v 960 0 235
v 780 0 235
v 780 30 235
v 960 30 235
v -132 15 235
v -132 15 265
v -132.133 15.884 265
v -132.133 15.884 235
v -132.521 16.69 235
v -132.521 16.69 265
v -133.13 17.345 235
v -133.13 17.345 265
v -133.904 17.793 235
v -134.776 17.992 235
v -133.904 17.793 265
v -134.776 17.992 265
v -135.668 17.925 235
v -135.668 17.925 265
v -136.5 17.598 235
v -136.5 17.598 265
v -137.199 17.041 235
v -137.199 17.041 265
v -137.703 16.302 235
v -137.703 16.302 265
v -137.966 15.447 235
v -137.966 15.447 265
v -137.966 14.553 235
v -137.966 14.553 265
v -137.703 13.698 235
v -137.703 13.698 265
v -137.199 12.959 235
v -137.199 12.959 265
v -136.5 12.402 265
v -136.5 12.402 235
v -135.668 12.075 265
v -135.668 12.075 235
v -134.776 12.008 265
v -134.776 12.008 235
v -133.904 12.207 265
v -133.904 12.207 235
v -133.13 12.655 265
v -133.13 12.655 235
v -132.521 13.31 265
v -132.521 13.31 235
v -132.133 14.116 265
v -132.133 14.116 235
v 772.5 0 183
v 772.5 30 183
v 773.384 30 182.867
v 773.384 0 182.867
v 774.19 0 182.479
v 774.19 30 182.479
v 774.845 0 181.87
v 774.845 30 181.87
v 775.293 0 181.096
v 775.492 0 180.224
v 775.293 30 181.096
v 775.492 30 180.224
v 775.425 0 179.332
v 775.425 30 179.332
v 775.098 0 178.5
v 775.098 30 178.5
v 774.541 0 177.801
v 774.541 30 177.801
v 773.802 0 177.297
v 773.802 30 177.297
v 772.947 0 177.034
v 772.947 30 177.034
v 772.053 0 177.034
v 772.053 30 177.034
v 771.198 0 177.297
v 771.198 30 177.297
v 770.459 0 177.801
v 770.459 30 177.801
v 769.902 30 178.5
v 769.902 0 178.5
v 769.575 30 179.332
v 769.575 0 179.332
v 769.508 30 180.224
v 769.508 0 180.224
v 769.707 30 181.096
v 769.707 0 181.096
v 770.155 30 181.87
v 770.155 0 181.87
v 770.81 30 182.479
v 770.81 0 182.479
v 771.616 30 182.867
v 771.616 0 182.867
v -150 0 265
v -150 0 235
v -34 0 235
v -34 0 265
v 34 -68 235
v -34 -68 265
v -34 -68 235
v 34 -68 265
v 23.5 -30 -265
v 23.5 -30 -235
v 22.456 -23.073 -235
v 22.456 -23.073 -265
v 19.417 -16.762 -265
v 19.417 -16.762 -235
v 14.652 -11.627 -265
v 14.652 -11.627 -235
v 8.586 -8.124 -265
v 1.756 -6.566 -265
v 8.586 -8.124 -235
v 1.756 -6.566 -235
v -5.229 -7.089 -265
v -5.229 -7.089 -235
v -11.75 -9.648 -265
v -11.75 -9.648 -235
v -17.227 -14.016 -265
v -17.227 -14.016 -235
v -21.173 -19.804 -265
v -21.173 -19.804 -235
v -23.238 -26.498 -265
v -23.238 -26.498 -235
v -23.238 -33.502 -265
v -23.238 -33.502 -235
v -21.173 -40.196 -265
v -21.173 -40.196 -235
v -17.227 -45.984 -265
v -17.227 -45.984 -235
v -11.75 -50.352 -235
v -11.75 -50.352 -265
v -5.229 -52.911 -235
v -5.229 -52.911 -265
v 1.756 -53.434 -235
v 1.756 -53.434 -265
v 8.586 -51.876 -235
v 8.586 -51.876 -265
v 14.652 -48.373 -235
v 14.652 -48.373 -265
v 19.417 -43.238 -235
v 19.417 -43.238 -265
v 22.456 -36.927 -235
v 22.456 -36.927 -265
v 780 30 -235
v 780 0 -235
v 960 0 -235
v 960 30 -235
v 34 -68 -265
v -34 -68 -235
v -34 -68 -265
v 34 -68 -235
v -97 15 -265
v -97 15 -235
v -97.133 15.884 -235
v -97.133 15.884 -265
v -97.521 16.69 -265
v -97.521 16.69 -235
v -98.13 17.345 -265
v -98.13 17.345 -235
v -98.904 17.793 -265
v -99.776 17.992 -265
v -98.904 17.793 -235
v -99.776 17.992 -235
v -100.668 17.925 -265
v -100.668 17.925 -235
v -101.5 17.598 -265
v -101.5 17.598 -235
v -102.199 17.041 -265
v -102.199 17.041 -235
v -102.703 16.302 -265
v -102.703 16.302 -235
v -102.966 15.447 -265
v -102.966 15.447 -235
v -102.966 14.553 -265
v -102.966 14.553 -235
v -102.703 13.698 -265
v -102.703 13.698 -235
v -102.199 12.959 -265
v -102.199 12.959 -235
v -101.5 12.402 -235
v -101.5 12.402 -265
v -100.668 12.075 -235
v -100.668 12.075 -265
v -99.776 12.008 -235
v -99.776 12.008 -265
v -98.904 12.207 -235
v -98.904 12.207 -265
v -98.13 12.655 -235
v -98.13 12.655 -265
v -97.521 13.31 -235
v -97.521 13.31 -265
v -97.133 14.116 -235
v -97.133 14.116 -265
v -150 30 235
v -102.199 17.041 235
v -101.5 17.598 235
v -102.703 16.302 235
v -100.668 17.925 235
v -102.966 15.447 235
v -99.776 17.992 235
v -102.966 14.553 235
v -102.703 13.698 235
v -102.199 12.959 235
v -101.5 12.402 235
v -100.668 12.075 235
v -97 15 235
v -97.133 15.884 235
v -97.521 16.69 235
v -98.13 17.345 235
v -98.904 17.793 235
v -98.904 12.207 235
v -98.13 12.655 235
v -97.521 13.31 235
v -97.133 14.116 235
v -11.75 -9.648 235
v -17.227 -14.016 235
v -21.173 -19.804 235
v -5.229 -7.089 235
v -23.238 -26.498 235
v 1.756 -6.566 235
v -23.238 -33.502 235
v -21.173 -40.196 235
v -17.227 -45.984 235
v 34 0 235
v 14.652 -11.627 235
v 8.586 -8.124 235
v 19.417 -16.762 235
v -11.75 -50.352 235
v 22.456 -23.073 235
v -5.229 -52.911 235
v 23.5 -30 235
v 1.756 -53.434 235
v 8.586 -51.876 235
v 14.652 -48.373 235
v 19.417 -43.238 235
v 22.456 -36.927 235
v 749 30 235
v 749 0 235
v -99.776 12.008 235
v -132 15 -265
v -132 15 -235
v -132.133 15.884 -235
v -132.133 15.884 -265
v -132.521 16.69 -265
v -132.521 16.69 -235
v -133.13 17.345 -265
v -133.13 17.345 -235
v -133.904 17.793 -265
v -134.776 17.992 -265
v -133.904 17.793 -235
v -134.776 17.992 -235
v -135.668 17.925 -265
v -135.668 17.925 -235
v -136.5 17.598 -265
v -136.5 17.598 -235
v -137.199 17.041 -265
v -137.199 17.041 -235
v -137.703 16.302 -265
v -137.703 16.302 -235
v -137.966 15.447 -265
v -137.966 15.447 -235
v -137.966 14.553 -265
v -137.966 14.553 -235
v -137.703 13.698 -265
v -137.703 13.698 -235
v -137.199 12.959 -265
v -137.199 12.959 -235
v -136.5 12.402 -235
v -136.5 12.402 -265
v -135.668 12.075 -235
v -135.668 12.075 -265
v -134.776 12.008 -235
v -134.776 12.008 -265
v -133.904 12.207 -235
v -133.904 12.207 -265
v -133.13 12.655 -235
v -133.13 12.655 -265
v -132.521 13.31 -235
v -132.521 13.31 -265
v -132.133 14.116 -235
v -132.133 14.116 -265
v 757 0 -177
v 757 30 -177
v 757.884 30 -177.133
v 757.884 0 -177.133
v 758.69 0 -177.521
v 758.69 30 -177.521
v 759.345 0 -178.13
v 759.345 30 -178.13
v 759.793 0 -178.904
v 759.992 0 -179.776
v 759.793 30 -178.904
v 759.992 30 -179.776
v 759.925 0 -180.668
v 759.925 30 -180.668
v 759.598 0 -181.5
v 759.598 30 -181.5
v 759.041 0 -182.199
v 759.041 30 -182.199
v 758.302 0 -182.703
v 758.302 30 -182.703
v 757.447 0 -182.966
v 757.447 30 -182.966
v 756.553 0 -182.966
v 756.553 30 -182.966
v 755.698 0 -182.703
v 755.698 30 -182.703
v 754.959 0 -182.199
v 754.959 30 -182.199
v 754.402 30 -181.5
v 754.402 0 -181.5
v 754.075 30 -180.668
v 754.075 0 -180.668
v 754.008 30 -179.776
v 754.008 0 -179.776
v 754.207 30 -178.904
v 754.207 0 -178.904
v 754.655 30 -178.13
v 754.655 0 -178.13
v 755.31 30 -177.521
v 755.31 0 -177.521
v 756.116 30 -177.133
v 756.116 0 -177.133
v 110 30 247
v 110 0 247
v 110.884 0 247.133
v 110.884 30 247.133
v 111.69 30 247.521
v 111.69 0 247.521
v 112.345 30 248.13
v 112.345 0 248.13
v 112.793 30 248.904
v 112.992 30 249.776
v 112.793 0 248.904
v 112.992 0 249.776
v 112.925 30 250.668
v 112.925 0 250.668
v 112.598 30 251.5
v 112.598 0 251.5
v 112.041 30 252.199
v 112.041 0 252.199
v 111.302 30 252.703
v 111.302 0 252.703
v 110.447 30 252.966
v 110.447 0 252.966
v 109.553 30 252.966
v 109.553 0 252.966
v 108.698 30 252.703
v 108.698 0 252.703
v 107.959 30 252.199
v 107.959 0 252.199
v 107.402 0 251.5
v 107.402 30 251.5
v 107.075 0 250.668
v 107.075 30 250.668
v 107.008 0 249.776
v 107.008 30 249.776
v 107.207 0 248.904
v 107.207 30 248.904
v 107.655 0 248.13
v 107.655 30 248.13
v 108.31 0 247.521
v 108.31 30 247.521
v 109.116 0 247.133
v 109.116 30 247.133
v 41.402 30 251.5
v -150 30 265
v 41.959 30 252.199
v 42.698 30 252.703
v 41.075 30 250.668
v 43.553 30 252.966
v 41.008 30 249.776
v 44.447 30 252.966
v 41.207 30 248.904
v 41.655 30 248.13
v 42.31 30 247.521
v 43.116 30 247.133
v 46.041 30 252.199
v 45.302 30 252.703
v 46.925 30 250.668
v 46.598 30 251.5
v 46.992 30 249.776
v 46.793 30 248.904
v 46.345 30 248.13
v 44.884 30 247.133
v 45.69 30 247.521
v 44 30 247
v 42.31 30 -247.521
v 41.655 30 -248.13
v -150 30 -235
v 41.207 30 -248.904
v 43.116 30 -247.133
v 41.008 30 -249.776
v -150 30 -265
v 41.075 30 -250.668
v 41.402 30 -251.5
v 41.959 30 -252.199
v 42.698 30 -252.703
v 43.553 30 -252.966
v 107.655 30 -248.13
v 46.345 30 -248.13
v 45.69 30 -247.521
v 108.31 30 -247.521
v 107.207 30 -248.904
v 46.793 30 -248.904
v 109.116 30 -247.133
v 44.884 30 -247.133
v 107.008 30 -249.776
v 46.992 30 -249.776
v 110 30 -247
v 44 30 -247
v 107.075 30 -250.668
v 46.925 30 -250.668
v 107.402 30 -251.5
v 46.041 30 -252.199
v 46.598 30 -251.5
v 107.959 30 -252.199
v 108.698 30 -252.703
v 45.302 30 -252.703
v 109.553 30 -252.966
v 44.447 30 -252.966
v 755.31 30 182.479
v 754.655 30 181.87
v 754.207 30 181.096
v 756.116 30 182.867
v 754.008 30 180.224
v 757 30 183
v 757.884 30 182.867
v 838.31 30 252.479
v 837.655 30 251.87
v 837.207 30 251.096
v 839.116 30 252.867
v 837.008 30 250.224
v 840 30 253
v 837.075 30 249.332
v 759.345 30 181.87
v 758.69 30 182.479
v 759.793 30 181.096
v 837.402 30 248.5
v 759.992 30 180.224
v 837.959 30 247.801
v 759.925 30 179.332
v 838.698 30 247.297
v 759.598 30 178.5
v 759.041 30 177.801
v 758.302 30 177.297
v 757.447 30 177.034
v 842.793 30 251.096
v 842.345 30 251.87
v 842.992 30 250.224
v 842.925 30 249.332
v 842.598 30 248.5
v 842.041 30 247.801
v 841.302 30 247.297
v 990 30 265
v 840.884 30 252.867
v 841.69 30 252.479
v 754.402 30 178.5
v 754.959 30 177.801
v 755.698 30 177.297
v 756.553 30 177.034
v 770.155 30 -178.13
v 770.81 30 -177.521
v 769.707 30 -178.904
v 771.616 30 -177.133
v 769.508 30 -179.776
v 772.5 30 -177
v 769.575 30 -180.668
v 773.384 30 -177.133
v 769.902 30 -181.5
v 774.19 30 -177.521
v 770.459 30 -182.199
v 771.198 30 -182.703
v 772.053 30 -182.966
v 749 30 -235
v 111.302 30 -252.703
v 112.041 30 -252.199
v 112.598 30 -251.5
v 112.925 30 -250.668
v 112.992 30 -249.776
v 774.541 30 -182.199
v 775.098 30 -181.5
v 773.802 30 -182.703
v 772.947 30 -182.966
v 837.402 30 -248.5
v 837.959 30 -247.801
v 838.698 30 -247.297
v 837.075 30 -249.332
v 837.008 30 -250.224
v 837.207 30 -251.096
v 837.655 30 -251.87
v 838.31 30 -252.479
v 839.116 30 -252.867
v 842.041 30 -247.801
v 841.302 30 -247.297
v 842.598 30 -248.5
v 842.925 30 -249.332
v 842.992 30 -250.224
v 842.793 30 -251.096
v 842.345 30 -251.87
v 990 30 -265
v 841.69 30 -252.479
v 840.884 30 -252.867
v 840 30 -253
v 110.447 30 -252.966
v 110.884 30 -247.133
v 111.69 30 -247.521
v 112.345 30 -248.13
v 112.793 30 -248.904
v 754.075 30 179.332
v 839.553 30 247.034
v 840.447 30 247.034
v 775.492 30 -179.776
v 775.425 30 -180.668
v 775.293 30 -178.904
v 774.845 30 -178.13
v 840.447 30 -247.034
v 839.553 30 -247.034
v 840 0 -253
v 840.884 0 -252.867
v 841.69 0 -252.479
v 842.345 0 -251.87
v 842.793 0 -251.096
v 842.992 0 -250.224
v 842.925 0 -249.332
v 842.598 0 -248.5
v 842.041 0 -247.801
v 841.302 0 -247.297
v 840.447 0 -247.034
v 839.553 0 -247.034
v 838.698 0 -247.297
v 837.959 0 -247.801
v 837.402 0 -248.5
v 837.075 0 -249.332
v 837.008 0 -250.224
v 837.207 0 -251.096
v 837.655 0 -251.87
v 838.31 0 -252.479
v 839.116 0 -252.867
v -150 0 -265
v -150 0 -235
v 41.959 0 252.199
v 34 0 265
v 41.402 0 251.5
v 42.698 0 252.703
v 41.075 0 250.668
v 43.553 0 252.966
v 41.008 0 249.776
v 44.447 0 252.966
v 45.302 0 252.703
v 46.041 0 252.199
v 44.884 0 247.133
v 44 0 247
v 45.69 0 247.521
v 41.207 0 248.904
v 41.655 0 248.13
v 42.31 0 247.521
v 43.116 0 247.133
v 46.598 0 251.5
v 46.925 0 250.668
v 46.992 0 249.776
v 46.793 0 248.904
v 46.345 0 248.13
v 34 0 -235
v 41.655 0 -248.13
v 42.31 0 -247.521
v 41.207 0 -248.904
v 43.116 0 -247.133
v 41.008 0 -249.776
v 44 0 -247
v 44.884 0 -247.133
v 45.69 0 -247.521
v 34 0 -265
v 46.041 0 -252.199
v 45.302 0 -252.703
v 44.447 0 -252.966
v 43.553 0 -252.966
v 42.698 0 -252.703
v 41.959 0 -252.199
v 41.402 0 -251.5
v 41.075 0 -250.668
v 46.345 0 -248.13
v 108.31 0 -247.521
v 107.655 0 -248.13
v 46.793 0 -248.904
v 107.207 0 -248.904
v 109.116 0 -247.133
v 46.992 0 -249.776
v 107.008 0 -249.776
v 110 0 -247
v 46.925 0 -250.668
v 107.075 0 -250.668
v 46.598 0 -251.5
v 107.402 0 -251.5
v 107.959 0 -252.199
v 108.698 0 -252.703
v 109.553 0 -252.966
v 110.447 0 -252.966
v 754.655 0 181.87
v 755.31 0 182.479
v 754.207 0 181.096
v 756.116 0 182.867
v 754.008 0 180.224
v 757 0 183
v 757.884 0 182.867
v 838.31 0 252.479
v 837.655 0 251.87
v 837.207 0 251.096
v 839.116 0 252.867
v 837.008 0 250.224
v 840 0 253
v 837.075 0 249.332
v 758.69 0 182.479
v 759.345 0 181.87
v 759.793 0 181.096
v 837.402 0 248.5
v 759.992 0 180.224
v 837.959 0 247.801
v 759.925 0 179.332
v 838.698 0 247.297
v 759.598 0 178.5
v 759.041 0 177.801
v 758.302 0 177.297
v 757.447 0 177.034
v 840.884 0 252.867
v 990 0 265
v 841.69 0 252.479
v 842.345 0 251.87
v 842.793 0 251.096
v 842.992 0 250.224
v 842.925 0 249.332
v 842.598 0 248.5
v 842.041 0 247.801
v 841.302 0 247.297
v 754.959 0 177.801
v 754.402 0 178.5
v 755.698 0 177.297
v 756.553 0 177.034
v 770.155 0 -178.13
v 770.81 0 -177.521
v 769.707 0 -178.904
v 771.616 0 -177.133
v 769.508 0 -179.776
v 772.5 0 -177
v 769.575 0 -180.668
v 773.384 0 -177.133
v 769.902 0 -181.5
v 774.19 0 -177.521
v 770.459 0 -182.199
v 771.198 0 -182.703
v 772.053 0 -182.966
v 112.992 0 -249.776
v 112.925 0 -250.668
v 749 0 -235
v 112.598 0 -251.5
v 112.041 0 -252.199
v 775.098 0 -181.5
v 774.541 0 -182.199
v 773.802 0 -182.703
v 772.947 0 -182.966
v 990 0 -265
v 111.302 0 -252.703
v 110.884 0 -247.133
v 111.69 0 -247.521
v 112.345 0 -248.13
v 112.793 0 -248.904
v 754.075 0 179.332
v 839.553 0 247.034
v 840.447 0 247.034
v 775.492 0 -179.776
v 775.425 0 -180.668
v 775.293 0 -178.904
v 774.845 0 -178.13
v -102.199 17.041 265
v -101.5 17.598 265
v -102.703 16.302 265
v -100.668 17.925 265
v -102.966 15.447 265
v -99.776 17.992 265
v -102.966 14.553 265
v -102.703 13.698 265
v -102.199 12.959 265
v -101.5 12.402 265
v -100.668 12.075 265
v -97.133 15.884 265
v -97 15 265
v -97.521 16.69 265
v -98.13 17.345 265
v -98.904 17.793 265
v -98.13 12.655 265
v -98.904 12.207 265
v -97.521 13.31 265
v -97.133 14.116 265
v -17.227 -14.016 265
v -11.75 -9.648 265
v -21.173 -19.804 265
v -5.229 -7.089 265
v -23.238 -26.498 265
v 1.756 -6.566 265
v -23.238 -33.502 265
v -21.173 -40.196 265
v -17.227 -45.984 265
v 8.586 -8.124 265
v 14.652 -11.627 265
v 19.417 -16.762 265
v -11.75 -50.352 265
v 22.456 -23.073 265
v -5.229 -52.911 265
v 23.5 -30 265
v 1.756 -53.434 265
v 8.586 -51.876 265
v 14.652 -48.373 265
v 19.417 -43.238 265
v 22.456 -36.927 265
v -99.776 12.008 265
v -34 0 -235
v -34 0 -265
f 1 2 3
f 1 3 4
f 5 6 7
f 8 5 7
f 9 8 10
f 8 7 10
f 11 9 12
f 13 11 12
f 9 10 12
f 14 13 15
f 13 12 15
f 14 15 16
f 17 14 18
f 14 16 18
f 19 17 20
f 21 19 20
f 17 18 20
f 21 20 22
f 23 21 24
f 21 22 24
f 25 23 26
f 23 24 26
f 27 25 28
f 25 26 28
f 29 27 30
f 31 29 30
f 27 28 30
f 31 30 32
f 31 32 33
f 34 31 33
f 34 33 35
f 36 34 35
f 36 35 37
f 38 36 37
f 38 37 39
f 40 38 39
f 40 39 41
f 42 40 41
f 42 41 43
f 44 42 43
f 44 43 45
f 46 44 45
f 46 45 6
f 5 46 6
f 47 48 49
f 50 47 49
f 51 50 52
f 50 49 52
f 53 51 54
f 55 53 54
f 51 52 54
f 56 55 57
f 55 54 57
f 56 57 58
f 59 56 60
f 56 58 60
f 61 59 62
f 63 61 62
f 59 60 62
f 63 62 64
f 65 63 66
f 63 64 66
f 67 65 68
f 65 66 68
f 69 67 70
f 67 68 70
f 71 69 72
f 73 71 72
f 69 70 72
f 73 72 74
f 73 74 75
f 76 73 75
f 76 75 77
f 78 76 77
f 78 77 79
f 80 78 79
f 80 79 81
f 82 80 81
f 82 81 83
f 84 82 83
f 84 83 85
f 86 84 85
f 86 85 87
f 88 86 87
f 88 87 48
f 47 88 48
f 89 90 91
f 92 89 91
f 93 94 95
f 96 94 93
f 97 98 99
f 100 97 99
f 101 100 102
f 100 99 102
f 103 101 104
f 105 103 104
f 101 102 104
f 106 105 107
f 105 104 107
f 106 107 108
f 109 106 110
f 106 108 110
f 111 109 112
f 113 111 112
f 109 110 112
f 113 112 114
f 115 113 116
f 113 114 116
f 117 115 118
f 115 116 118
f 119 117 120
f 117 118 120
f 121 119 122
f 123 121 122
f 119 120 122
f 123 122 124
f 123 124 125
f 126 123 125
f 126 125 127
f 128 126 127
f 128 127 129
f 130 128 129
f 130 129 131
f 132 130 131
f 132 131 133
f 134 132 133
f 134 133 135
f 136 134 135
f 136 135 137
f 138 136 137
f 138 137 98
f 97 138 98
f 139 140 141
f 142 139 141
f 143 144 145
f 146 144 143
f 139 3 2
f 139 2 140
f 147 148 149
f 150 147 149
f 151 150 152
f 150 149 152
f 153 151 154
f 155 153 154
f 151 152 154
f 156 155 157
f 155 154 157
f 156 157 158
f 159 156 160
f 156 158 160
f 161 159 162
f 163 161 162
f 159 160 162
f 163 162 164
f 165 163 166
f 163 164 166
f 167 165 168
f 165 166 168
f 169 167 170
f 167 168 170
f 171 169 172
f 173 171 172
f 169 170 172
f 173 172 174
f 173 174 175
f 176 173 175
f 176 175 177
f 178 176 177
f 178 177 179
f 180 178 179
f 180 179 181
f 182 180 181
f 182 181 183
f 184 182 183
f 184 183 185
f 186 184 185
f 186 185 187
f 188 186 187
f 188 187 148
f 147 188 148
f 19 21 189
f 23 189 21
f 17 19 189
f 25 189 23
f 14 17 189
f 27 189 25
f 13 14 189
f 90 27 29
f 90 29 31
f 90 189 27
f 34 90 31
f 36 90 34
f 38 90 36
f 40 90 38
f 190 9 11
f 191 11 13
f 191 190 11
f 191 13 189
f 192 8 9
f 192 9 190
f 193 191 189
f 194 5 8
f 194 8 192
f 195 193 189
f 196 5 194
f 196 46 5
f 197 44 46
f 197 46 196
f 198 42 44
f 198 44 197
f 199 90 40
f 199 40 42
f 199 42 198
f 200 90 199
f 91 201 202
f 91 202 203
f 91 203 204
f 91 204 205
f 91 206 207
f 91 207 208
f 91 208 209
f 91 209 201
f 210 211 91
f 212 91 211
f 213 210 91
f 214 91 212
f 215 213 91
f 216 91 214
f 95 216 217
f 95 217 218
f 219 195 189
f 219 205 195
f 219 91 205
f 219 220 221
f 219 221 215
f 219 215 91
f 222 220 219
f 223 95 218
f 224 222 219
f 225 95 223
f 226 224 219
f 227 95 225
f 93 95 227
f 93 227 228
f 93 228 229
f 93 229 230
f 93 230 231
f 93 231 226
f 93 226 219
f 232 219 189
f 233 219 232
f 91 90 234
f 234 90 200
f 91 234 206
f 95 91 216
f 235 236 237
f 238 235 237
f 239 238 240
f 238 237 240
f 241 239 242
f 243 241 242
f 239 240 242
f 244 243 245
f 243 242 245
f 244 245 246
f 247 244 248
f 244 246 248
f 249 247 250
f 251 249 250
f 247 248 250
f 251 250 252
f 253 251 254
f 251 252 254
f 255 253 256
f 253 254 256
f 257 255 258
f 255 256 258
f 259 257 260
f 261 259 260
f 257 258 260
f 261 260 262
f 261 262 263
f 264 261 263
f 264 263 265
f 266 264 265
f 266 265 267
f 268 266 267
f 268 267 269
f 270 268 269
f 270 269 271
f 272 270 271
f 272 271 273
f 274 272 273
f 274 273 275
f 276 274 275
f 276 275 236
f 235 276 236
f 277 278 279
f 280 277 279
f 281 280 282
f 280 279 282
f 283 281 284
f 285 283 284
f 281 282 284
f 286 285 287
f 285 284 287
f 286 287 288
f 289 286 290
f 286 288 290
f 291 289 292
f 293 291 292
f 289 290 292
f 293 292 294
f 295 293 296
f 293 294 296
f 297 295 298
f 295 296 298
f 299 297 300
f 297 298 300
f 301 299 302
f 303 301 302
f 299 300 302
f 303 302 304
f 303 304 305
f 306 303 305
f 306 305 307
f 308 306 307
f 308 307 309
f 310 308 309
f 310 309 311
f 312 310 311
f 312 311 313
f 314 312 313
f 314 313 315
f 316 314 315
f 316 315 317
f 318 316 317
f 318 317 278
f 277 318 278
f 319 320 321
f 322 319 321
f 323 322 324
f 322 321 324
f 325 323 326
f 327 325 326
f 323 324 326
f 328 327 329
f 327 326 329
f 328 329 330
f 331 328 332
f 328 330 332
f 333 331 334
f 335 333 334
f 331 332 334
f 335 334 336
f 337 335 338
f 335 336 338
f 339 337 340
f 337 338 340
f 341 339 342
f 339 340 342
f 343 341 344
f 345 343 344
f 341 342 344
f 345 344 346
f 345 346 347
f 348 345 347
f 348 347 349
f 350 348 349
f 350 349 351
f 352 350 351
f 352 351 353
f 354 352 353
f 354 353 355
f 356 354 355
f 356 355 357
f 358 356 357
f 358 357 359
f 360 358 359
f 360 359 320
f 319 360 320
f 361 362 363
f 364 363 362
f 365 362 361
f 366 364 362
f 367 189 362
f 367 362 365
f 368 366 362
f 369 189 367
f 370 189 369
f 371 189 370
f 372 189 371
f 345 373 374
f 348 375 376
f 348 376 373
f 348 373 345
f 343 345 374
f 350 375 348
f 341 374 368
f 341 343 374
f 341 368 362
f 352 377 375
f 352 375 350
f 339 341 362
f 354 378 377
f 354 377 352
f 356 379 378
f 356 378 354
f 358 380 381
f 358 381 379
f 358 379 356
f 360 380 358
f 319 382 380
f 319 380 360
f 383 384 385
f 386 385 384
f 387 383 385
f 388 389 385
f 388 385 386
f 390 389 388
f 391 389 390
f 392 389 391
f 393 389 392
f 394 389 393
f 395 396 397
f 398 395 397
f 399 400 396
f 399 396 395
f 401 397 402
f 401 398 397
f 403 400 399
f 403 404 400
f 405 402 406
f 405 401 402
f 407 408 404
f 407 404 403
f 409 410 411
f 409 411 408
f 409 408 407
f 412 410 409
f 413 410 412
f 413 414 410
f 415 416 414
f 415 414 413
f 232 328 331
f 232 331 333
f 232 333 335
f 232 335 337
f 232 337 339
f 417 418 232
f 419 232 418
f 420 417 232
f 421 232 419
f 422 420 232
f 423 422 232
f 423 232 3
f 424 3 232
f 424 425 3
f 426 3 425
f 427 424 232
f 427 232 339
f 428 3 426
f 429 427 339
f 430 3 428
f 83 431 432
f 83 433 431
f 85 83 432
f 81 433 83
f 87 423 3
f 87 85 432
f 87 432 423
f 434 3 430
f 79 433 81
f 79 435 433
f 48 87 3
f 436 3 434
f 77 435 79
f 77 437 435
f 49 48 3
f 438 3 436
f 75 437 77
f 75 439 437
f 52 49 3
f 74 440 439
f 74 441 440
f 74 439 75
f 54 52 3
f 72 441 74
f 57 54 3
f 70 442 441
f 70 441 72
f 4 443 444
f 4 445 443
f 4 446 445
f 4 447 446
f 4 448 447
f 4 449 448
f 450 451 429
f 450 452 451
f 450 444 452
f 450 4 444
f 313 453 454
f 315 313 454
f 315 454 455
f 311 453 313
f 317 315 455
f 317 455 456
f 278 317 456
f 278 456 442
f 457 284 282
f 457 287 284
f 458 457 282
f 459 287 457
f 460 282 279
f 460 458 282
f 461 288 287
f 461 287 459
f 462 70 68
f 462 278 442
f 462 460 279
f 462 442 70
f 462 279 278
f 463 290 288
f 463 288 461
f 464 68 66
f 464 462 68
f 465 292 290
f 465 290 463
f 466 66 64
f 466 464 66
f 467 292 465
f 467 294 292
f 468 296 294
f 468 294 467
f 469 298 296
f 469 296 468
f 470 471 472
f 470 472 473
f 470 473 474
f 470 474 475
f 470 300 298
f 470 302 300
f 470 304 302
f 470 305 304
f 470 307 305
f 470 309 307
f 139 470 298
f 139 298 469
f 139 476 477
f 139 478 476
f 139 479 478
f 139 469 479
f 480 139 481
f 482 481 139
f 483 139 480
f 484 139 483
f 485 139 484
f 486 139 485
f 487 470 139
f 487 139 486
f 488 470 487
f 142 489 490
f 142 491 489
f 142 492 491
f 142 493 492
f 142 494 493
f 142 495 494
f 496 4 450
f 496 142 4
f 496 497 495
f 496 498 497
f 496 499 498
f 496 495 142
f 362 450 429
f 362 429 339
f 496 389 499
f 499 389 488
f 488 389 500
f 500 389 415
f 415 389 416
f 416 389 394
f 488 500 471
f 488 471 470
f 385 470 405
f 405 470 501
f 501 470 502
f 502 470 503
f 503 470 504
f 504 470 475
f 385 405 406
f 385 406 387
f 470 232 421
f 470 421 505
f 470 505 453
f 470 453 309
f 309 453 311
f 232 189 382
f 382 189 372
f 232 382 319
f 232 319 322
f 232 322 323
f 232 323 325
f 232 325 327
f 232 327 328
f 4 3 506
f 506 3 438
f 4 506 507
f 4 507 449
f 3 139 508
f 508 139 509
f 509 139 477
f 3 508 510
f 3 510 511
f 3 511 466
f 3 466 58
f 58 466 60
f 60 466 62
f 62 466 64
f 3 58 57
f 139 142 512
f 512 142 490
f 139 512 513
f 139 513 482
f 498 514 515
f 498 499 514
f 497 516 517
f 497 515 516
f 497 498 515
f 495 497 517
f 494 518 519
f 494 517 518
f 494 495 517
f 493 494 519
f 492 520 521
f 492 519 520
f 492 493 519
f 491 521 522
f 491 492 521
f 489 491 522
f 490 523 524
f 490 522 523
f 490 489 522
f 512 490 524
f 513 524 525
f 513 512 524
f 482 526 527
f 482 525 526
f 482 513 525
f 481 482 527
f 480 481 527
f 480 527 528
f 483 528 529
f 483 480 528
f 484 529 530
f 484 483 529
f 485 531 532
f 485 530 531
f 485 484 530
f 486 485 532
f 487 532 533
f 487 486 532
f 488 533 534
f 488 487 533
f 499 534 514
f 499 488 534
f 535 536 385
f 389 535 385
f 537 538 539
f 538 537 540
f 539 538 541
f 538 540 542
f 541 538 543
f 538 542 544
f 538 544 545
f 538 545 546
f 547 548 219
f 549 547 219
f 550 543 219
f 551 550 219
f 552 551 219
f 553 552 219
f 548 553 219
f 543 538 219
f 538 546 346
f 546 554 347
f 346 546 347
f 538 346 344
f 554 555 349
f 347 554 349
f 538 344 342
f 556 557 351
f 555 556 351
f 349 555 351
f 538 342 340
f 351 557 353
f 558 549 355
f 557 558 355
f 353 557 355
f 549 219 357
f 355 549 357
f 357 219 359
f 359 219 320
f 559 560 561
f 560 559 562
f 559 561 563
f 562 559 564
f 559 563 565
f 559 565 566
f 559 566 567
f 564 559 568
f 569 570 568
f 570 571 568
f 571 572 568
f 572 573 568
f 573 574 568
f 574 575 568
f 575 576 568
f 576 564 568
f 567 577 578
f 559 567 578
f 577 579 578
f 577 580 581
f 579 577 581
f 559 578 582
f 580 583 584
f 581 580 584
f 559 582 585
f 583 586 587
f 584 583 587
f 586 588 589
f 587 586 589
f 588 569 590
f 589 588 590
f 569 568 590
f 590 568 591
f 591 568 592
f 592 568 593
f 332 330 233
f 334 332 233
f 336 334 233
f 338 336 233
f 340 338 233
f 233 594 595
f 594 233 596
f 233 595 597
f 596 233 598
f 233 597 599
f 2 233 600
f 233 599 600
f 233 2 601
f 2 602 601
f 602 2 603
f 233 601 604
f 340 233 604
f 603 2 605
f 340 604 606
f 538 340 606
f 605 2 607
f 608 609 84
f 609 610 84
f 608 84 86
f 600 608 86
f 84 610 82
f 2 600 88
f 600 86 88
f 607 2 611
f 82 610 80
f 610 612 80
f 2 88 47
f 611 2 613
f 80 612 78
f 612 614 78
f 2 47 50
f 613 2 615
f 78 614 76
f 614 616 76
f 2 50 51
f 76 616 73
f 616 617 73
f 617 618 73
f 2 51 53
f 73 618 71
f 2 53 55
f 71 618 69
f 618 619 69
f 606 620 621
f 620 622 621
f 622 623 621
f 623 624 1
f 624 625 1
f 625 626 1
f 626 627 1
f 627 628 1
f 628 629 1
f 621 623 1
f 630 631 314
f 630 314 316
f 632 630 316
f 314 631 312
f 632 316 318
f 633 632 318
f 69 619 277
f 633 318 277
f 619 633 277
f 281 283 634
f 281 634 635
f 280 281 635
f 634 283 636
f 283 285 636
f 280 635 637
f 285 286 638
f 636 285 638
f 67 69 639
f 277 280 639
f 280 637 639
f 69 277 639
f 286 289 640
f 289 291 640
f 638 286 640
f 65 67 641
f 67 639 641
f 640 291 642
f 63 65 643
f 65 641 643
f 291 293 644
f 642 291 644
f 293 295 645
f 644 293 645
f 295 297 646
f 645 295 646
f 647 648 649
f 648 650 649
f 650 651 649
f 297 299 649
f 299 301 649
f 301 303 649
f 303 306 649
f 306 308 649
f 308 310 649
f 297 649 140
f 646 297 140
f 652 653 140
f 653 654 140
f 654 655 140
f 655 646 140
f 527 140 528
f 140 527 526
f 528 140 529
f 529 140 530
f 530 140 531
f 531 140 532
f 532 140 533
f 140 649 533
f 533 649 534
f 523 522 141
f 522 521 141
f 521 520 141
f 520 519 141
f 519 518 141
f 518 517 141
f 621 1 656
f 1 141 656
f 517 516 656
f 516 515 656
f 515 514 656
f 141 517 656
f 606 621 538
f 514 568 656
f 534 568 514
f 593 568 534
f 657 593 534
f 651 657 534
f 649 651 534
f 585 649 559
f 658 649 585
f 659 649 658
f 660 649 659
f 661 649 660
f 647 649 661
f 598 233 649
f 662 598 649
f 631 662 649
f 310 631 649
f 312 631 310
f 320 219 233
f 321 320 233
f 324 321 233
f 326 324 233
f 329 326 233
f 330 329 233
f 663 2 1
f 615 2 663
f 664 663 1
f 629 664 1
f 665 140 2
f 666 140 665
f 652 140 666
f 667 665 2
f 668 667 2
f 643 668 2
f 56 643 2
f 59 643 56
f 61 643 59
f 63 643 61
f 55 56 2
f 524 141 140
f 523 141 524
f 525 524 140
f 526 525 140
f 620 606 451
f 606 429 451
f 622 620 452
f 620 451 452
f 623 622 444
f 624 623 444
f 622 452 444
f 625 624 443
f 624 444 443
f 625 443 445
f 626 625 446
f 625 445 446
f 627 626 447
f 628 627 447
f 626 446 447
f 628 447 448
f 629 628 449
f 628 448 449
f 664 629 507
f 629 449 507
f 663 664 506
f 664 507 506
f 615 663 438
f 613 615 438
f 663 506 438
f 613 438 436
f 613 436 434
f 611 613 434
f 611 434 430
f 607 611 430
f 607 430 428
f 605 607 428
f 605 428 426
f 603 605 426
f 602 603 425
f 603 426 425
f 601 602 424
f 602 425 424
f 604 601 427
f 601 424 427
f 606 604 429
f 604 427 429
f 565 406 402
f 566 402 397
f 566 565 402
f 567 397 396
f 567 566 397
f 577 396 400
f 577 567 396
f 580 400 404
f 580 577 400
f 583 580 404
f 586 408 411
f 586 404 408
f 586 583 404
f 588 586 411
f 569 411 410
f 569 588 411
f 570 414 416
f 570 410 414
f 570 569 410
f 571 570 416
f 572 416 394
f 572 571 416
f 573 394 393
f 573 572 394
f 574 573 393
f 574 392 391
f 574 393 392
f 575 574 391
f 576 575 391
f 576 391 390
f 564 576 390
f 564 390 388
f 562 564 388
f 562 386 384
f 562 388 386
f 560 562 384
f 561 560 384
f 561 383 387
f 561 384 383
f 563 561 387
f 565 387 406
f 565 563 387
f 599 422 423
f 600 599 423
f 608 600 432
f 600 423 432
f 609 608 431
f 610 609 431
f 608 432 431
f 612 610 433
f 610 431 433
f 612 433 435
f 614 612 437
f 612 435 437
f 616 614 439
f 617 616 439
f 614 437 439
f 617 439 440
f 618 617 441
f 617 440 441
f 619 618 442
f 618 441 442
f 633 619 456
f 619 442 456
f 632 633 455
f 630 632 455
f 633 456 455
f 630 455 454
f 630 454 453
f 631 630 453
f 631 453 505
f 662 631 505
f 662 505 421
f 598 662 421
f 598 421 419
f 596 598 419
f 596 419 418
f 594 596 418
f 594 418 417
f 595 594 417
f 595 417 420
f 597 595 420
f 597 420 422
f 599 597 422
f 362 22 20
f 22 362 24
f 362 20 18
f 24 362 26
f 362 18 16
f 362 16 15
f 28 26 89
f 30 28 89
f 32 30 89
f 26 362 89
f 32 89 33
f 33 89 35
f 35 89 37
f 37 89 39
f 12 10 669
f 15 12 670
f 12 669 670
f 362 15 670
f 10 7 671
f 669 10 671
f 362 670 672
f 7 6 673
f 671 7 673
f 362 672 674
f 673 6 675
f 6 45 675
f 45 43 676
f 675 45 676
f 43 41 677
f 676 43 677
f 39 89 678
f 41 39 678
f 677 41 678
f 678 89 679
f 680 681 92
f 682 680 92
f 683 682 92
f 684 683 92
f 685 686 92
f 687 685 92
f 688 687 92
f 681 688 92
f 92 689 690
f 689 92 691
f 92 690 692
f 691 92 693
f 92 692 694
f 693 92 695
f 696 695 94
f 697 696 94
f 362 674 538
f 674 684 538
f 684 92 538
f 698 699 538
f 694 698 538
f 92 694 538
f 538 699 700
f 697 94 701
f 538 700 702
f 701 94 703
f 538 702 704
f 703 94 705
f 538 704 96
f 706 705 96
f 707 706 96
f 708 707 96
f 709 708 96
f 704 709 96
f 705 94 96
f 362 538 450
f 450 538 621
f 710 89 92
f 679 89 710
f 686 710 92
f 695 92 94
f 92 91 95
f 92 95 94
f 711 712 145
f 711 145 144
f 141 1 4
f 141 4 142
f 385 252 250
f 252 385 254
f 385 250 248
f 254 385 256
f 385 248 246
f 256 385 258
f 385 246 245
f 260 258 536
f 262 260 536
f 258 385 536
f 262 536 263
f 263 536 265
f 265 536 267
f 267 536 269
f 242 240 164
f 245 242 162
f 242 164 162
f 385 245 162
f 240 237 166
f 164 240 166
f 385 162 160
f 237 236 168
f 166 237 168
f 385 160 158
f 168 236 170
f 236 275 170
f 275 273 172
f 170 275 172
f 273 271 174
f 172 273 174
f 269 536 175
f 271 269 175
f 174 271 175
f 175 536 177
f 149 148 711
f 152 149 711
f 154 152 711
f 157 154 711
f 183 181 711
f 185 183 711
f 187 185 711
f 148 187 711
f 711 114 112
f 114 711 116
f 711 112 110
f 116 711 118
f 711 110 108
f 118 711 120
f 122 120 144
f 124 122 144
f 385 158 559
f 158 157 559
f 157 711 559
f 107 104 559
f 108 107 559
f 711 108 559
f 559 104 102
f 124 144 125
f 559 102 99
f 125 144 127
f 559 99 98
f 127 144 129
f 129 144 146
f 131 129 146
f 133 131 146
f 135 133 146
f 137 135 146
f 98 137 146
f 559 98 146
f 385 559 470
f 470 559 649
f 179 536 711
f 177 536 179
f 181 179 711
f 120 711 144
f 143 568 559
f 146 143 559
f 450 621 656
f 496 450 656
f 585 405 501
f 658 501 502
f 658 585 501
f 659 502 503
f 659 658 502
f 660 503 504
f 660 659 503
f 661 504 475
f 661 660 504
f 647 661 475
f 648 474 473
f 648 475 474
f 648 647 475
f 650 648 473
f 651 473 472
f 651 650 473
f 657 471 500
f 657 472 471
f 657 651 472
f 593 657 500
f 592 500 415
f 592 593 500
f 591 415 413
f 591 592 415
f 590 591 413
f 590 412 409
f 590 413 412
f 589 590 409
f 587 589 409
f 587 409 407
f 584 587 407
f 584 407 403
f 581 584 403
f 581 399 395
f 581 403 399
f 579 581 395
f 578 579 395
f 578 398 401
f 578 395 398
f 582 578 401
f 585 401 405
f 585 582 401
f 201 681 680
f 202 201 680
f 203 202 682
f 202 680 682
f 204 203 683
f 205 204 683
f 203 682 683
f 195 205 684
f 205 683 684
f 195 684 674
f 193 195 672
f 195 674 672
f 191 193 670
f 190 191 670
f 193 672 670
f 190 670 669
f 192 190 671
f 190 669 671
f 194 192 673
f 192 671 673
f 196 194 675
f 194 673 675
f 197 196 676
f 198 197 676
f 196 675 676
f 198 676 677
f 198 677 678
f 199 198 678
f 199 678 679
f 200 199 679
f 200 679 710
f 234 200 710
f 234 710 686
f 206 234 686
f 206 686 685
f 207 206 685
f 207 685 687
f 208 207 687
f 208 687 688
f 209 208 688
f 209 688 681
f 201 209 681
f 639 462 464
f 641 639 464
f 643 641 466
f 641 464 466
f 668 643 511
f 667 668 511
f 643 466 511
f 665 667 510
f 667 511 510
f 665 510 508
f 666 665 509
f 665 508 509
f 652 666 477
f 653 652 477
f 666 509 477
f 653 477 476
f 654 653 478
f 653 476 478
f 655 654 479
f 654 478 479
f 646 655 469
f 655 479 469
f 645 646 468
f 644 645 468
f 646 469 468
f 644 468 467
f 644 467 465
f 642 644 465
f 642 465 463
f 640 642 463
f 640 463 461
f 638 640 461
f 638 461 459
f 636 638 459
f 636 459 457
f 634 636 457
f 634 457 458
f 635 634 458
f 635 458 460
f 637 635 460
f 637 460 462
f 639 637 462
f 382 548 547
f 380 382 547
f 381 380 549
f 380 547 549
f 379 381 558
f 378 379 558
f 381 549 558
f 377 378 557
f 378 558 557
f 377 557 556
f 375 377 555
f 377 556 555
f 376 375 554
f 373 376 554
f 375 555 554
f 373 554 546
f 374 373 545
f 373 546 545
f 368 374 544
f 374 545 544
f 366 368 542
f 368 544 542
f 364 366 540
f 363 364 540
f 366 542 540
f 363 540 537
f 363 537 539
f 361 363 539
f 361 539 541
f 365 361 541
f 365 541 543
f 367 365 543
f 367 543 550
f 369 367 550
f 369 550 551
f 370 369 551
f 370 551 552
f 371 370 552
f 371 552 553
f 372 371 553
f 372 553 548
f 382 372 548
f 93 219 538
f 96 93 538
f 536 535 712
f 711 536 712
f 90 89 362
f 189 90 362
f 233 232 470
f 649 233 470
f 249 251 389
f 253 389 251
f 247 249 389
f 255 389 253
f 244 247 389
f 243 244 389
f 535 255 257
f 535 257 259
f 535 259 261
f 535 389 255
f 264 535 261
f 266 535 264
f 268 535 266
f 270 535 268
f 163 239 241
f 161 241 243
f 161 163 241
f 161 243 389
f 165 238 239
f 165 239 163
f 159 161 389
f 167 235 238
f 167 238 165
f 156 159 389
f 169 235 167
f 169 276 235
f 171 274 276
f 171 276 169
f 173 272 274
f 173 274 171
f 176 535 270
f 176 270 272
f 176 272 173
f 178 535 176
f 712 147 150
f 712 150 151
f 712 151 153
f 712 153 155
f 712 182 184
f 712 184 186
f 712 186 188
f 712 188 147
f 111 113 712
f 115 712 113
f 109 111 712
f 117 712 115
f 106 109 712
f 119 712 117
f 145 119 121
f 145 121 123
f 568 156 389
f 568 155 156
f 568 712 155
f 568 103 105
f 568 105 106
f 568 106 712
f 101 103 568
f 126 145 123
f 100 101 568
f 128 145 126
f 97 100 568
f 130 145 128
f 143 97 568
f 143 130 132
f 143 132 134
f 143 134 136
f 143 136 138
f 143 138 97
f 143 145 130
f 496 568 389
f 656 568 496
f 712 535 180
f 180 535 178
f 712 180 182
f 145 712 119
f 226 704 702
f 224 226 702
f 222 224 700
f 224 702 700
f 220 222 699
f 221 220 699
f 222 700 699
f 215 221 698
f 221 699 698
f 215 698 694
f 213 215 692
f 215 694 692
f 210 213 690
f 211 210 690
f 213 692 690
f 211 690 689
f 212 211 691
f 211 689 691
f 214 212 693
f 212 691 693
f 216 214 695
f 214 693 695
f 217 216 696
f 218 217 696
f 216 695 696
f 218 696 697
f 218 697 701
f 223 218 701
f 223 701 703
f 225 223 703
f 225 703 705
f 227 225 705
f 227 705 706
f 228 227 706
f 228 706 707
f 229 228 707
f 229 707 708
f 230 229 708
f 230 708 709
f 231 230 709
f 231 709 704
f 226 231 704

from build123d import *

# Parameters (mm, degrees)
SKETCH_1_W          = 1980
SKETCH_1_H          = 530
SKETCH_1_W_2        = 1920
SKETCH_1_H_2        = 470
EXTRUDE_1_DEPTH     = 30
SKETCH_2_W          = 68
SKETCH_2_H          = 30
EXTRUDE_2_DEPTH     = 68
SKETCH_3_R          = 23.5
CUT_EXTRUDE_1_DEPTH = 1125.999555555
SKETCH_4_W          = 31
SKETCH_4_H          = 470
EXTRUDE_3_DEPTH     = 30
SKETCH_5_R          = 3
CUT_EXTRUDE_2_DEPTH = 1030.528532873
SKETCH_6_R          = 3
CUT_EXTRUDE_3_DEPTH = 1030.528532873
SKETCH_7_W          = 917.525313644
SKETCH_7_H          = 30
CUT_EXTRUDE_4_DEPTH = 1125.999555555
SKETCH_8_R          = 3
CUT_EXTRUDE_5_DEPTH = 1125.999555555
SKETCH_9_R          = 3
CUT_EXTRUDE_6_DEPTH = 1028.107102497
SKETCH_10_R         = 3
CUT_EXTRUDE_7_DEPTH = 1125.999555555


with BuildPart() as part:
    # 草图1 → 凸台-拉伸1 (new body)
    with BuildSketch(Plane(origin=(0, 0, 0), x_dir=(1, 0, 0), z_dir=(0, 1, 0))):
        Rectangle(SKETCH_1_W, SKETCH_1_H)
        Rectangle(SKETCH_1_W_2, SKETCH_1_H_2, mode=Mode.SUBTRACT)
    extrude(amount=EXTRUDE_1_DEPTH)

    # 草图2 → 凸台-拉伸2 (add)
    with BuildSketch(Plane.XZ):
        with Locations((0, 250)):
            Rectangle(SKETCH_2_W, SKETCH_2_H)
        with Locations((0, -250)):
            Rectangle(SKETCH_2_W, SKETCH_2_H)
    extrude(amount=EXTRUDE_2_DEPTH)

    # 草图3 → 切除-拉伸1 (cut, through all)
    with BuildSketch(Plane.XY.offset(265)):
        with Locations((0, -30)):
            Circle(SKETCH_3_R)
    extrude(amount=-CUT_EXTRUDE_1_DEPTH, mode=Mode.SUBTRACT)

    # 草图4 → 凸台-拉伸3 (add)
    with BuildSketch(Plane(origin=(0, 30, 0), x_dir=(1, 0, 0), z_dir=(0, 1, 0))):
        with Locations((764.5, 0)):
            Rectangle(SKETCH_4_W, SKETCH_4_H)
    extrude(amount=-EXTRUDE_3_DEPTH)

    # 草图5 → 切除-拉伸2 (cut, through all)
    with BuildSketch(Plane(origin=(0, 30, 0), x_dir=(1, 0, 0), z_dir=(0, 1, 0))):
        with Locations(Location((757, 180, 0), (0, 0, 270))):
            Circle(SKETCH_5_R)
        with Locations(Location((772.5, 180, 0), (0, 0, 270))):
            Circle(SKETCH_5_R)
        with Locations(Location((757, -180, 0), (0, 0, 270))):
            Circle(SKETCH_5_R)
        with Locations(Location((772.5, -180, 0), (0, 0, 270))):
            Circle(SKETCH_5_R)
    extrude(amount=-CUT_EXTRUDE_2_DEPTH, mode=Mode.SUBTRACT)

    # 草图6 → 切除-拉伸3 (cut, symmetric)
    with BuildSketch(Plane(origin=(0, 30, 0), x_dir=(1, 0, 0), z_dir=(0, 1, 0))):
        with Locations(Location((840, -250, 0), (0, 0, 270))):
            Circle(SKETCH_6_R)
    cut_extrude_3 = extrude(amount=CUT_EXTRUDE_3_DEPTH, both=True, mode=Mode.SUBTRACT)

    # 镜向1: 切除-拉伸3 across plane
    add(cut_extrude_3.mirror(Plane.XY), mode=Mode.SUBTRACT)

    # 草图7 → 切除-拉伸4 (cut, through all)
    with BuildSketch(Plane.XY.offset(265)):
        with Locations((-608.762656822, 15)):
            Rectangle(SKETCH_7_W, SKETCH_7_H)
    extrude(amount=-CUT_EXTRUDE_4_DEPTH, mode=Mode.SUBTRACT)

    # 草图8 → 切除-拉伸5 (cut, through all)
    with BuildSketch(Plane.XY.offset(265)):
        with Locations((-100, 15)):
            Circle(SKETCH_8_R)
    extrude(amount=-CUT_EXTRUDE_5_DEPTH, mode=Mode.SUBTRACT)

    # 草图9 → 切除-拉伸6 (cut, through all)
    with BuildSketch(Plane.XZ):
        with Locations(Location((110, 250, 0), (0, 0, 270))):
            Circle(SKETCH_9_R)
        with Locations(Location((44, 250, 0), (0, 0, 270))):
            Circle(SKETCH_9_R)
    cut_extrude_6 = extrude(amount=-CUT_EXTRUDE_6_DEPTH, mode=Mode.SUBTRACT)

    # 镜向2: 切除-拉伸6 across plane
    add(cut_extrude_6.mirror(Plane.XY), mode=Mode.SUBTRACT)

    # 草图10 → 切除-拉伸7 (cut, through all)
    with BuildSketch(Plane.XY.offset(265)):
        with Locations((-135, 15)):
            Circle(SKETCH_10_R)
    extrude(amount=-CUT_EXTRUDE_7_DEPTH, mode=Mode.SUBTRACT)


solid = part.part
